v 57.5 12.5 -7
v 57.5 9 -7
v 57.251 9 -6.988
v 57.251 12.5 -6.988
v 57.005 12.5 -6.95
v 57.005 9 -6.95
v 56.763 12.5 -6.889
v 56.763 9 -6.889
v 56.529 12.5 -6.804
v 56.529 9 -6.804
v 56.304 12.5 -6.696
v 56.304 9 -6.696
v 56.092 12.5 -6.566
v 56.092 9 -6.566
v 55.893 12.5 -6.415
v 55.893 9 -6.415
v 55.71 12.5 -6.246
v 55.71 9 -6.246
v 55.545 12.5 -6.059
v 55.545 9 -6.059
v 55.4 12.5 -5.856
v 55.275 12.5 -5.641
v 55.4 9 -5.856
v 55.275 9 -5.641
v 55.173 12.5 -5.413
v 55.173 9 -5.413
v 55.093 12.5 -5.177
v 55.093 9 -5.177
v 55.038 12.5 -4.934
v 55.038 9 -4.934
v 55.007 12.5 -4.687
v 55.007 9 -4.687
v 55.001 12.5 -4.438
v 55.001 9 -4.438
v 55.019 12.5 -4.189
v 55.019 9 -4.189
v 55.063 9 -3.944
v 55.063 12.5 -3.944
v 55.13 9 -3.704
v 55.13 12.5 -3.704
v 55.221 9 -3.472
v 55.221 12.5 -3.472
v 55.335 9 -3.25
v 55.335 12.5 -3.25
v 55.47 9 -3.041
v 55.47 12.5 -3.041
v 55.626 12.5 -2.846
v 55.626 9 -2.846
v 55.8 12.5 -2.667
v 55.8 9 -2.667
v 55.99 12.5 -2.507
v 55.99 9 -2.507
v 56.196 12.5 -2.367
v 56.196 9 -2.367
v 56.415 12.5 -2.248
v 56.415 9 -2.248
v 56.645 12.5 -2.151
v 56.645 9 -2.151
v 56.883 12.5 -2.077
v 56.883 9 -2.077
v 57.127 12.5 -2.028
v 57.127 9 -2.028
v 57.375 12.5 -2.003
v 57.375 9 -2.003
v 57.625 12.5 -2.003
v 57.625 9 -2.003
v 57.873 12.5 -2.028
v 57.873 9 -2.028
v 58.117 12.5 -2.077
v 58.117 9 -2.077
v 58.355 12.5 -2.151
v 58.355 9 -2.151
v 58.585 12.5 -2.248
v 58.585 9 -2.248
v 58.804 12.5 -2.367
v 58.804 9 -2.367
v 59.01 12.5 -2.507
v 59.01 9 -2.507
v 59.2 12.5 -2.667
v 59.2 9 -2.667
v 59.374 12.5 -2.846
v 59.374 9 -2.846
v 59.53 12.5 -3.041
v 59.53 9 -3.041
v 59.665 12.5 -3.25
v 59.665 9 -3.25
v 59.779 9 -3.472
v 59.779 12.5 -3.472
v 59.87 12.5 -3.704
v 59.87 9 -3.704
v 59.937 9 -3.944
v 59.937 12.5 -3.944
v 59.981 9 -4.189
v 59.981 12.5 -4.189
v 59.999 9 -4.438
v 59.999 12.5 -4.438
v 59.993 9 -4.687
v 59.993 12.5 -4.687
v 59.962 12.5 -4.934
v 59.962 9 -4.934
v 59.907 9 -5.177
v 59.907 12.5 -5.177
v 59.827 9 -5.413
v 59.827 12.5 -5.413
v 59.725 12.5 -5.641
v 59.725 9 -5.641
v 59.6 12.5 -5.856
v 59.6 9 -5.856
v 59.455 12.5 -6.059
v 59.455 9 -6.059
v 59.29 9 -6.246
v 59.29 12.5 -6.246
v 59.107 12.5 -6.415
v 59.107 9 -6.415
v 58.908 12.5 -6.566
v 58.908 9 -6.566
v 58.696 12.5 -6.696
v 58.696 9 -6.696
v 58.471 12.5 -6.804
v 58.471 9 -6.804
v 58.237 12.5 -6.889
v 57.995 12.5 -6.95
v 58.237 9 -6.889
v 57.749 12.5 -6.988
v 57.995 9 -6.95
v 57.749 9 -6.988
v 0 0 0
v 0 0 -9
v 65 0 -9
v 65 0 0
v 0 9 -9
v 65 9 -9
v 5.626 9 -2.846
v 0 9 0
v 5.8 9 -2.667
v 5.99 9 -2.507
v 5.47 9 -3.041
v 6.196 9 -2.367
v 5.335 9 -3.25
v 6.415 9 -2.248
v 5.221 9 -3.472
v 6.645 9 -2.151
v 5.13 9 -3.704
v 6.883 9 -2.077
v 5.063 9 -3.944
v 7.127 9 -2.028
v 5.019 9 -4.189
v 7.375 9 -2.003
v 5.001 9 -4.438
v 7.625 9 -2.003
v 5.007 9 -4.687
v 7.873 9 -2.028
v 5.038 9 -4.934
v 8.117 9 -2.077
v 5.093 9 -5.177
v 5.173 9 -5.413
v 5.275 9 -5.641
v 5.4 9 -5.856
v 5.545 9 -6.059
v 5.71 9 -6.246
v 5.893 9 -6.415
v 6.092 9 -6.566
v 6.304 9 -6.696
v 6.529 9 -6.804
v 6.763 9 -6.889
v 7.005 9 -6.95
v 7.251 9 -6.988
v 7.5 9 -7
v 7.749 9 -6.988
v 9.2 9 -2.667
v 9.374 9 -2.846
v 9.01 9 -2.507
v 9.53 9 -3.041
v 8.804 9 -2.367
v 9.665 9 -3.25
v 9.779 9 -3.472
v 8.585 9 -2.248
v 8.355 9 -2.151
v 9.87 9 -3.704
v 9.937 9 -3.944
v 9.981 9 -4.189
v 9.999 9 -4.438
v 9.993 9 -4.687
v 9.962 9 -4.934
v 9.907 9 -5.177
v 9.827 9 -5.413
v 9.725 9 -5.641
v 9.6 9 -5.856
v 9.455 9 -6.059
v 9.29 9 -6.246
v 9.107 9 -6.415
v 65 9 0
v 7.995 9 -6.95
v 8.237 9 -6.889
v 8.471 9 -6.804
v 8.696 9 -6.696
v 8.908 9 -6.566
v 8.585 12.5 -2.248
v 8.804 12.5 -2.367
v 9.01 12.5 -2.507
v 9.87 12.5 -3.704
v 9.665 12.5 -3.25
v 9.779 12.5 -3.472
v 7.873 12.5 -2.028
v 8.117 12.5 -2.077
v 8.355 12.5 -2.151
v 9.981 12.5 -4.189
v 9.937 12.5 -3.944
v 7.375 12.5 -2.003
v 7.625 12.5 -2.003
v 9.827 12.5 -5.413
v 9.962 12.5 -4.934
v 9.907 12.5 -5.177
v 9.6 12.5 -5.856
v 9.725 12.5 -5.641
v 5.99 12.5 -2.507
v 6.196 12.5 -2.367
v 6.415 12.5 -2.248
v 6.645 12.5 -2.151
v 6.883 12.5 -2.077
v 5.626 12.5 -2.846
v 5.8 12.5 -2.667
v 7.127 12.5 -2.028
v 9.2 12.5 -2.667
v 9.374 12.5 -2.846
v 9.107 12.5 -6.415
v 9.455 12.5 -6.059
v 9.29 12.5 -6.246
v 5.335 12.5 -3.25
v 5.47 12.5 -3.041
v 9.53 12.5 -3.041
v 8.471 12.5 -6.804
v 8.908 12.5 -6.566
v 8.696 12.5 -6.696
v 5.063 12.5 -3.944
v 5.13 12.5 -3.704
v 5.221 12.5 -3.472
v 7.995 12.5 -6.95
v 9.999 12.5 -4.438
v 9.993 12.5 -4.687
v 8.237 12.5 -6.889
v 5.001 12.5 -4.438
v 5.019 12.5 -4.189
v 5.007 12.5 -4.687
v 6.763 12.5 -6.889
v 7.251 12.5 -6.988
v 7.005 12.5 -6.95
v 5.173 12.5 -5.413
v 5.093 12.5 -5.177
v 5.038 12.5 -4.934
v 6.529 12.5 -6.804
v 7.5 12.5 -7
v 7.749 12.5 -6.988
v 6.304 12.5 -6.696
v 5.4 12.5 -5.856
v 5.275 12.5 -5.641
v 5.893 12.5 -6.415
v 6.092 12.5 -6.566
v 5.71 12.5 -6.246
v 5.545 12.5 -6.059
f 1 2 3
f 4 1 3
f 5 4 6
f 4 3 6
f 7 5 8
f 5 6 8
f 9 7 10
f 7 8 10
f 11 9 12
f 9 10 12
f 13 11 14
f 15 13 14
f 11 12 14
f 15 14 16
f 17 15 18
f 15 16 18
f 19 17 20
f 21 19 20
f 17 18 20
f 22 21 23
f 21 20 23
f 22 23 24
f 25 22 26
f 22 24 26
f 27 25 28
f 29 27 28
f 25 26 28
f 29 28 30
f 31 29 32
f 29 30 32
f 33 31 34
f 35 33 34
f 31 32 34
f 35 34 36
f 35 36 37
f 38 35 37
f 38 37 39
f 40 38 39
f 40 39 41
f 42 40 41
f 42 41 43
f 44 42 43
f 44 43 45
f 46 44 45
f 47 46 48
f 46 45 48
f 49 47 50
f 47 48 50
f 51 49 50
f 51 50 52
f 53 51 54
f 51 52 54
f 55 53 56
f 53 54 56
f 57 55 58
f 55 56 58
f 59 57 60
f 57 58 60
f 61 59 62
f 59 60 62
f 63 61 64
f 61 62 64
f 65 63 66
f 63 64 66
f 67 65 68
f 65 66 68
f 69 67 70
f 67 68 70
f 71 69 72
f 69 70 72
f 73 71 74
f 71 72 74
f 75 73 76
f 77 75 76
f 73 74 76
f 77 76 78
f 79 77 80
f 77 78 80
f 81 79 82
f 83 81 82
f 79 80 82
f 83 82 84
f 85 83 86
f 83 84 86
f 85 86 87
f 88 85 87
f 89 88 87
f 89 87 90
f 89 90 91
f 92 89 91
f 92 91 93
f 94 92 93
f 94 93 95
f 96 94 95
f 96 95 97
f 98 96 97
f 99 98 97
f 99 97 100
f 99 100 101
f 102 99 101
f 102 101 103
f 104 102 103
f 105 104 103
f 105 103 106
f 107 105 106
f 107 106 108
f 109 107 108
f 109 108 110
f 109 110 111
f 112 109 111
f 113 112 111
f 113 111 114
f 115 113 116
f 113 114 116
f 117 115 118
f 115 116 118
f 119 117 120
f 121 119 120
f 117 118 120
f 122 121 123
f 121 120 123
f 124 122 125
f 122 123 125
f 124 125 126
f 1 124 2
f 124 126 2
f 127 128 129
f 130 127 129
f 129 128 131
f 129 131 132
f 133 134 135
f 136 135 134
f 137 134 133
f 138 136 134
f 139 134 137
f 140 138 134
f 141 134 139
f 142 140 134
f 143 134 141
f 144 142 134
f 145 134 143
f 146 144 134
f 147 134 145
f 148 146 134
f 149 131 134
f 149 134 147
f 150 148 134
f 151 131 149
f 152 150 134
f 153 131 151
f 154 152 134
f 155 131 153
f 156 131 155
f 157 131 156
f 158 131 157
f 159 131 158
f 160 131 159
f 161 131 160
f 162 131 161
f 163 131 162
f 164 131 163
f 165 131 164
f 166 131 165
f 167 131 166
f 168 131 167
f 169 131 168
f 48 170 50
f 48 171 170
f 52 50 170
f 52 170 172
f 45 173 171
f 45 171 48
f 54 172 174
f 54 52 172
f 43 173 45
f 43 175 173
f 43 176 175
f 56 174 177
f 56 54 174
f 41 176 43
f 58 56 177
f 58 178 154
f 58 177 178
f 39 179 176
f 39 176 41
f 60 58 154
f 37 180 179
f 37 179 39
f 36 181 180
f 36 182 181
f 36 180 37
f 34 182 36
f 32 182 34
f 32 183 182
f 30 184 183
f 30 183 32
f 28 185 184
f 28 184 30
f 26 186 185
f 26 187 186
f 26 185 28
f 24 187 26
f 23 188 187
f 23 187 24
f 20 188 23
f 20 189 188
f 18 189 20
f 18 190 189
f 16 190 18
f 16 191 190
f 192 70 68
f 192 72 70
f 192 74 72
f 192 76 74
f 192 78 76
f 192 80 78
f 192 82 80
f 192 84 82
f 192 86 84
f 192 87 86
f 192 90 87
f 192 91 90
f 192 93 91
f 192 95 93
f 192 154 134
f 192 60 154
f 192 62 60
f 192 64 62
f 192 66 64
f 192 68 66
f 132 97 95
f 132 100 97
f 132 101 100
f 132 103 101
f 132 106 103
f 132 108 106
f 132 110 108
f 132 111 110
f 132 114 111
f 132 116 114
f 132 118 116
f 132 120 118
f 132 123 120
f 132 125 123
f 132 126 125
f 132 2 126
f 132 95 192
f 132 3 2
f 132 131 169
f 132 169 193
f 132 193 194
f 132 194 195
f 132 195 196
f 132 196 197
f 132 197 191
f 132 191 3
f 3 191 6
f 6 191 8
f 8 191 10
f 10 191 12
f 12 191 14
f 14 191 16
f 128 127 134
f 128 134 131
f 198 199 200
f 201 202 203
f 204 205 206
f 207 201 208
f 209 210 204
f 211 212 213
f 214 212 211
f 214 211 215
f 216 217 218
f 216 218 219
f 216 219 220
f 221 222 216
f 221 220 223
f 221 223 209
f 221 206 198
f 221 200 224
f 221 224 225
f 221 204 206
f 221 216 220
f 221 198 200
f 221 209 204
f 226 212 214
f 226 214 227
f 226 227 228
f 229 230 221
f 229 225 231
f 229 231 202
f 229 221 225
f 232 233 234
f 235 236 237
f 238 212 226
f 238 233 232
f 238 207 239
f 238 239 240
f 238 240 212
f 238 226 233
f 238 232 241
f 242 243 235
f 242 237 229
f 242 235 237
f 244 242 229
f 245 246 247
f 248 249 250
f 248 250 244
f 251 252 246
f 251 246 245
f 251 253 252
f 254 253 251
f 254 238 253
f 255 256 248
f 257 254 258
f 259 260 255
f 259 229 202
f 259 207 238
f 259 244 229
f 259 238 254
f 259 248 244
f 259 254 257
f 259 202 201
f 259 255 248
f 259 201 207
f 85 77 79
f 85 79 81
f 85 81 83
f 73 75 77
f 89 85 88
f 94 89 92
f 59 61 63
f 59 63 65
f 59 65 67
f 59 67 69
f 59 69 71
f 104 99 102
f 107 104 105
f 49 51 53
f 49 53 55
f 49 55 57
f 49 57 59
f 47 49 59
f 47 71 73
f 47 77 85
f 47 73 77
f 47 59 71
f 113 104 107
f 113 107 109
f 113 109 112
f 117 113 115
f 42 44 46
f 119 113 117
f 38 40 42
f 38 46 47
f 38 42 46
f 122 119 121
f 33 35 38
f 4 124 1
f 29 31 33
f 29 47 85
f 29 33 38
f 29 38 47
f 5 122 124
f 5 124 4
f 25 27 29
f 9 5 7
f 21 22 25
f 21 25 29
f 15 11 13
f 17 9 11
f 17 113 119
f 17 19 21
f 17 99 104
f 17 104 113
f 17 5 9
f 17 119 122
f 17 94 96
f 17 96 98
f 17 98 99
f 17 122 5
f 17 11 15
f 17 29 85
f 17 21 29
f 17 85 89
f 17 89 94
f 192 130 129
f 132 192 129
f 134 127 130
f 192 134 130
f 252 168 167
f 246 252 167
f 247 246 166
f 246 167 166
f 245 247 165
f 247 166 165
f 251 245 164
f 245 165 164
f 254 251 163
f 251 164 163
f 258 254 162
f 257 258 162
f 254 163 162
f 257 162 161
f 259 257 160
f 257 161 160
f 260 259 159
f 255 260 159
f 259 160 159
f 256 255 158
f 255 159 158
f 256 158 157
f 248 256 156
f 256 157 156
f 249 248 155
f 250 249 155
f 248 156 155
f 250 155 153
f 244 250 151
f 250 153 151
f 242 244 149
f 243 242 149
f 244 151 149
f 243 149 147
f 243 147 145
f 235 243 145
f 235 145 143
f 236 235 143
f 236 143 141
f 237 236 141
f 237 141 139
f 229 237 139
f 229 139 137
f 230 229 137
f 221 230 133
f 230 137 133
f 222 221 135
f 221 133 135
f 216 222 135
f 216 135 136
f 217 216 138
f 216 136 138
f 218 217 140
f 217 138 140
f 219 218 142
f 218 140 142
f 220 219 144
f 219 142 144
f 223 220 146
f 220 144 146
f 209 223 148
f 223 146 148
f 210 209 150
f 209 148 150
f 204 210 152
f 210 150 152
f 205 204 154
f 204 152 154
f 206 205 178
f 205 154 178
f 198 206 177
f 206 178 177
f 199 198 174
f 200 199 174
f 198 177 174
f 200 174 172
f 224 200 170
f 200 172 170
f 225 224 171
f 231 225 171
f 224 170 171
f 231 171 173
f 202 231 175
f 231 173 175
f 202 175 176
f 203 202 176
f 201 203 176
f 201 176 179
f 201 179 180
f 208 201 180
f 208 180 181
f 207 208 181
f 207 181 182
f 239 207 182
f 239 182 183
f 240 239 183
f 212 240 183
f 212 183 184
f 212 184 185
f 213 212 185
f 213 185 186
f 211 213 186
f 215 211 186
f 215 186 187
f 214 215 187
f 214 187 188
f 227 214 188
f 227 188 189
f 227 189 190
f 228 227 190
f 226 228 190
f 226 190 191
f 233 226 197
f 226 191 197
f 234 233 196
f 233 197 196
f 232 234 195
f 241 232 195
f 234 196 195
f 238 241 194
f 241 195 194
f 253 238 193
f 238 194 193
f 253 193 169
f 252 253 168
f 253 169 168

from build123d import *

# Parameters (mm, degrees)
SKETCH1_W           = 65
SKETCH1_H           = 9
BOSS_EXTRUDE1_DEPTH = 9
SKETCH2_R           = 2.5
BOSS_EXTRUDE2_DEPTH = 3.5


with BuildPart() as part:
    # Sketch1 → Boss-Extrude1 (new body)
    with BuildSketch(Plane(origin=(0, 0, 0), x_dir=(1, 0, 0), z_dir=(0, 1, 0))):
        with Locations((32.5, 4.5)):
            Rectangle(SKETCH1_W, SKETCH1_H)
    extrude(amount=BOSS_EXTRUDE1_DEPTH)

    # Sketch2 → Boss-Extrude2 (add)
    with BuildSketch(Plane(origin=(0, 9, 0), x_dir=(1, 0, 0), z_dir=(0, 1, 0))):
        with Locations(Location((7.5, 4.5, 0), (0, 0, 90))):  # turned: the seam where the file's is
            Circle(SKETCH2_R)
        with Locations(Location((57.5, 4.5, 0), (0, 0, 90))):  # turned: the seam where the file's is
            Circle(SKETCH2_R)
    extrude(amount=BOSS_EXTRUDE2_DEPTH)


solid = part.part
